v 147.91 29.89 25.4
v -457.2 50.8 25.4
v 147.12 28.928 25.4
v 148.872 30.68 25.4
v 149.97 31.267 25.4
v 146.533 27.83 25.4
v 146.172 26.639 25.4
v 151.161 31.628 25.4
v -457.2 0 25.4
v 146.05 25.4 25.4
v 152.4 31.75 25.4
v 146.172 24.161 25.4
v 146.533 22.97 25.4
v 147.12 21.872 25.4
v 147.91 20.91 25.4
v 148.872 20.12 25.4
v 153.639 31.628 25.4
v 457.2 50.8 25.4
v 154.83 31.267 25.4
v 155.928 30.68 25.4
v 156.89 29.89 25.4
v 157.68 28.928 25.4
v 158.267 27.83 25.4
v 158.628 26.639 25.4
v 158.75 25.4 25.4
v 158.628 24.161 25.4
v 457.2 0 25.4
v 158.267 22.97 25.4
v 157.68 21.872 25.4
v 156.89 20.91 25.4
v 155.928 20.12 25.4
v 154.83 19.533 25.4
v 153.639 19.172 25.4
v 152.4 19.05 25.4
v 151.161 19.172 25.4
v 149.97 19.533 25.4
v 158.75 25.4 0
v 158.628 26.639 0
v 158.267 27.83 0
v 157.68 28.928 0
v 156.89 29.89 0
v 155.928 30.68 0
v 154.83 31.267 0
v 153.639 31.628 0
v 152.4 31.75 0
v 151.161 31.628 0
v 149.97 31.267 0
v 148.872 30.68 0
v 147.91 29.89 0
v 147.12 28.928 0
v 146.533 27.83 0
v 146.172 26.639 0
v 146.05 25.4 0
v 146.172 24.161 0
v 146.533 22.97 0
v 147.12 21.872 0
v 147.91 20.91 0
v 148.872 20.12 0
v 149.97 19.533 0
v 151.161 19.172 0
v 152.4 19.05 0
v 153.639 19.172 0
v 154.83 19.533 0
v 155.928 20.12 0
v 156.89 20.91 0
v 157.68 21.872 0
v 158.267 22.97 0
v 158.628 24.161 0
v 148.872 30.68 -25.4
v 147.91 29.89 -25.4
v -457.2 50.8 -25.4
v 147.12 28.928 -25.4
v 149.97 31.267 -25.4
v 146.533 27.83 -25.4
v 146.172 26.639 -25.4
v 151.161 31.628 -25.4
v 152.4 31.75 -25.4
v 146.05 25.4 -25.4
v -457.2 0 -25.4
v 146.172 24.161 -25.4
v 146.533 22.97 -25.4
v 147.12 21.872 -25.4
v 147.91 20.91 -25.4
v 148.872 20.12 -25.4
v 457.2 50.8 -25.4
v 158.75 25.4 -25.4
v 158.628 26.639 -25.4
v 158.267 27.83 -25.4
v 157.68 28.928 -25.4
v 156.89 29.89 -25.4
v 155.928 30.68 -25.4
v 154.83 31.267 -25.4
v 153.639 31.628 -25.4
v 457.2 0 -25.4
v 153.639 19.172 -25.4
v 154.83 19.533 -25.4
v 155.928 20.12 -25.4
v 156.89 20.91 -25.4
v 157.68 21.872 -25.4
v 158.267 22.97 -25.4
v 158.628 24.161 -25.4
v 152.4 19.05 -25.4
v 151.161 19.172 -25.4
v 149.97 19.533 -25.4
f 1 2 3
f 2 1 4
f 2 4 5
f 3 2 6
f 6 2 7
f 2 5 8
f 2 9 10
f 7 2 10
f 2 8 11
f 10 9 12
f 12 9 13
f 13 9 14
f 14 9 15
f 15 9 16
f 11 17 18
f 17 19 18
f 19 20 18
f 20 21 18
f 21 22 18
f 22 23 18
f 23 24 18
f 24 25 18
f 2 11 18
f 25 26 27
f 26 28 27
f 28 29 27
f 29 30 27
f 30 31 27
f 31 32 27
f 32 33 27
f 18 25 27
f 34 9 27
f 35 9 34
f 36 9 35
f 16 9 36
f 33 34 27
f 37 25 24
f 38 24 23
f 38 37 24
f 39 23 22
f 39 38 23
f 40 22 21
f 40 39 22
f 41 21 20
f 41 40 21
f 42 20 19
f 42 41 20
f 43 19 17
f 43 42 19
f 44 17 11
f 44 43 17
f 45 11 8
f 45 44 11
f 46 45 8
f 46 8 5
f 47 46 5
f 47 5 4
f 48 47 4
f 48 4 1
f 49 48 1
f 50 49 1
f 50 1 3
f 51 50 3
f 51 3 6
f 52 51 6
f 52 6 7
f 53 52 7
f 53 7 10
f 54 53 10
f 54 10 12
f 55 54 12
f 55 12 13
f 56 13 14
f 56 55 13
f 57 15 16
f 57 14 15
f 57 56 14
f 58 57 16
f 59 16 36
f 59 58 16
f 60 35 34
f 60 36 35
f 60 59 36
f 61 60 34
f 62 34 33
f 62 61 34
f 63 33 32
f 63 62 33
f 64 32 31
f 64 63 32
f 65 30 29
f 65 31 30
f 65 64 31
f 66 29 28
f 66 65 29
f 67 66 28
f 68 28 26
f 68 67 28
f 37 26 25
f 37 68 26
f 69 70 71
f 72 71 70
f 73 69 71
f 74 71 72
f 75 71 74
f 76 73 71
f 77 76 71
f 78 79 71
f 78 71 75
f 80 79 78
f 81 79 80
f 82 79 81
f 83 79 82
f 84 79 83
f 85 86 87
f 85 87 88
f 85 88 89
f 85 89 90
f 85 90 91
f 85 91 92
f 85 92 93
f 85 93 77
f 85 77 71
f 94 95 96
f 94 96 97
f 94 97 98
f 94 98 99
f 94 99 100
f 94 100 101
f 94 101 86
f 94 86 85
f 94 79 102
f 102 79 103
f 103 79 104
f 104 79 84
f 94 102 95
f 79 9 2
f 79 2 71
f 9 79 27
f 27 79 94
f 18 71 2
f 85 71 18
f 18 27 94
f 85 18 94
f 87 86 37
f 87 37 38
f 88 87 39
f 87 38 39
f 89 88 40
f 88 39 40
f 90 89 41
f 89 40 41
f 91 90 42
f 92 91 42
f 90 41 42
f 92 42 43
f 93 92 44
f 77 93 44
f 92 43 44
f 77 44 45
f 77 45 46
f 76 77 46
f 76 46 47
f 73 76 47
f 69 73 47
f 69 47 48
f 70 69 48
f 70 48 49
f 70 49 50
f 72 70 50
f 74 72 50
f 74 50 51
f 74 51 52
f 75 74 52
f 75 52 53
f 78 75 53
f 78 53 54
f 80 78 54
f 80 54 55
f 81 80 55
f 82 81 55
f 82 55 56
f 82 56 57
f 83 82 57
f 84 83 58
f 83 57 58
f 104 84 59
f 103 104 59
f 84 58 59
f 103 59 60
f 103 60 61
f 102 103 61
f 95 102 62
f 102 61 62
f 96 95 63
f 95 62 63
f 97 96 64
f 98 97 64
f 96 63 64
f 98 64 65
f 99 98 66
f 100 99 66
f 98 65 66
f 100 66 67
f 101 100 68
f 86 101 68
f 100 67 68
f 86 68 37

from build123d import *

# Parameters (mm, degrees)
SKETCH1_W               = 914.4
SKETCH1_H               = 50.8
BOSS_EXTRUDE1_DEPTH     = 50.8
SKETCH2_R               = 6.35
CUT_EXTRUDE1_DEPTH      = 26.4
CUT_EXTRUDE1_DEPTH_BACK = 26.4


with BuildPart() as part:
    # Sketch1 → Boss-Extrude1 (new body)
    with BuildSketch(Plane(origin=(0, 0, 0), x_dir=(1, 0, 0), z_dir=(0, 1, 0))):
        Rectangle(SKETCH1_W, SKETCH1_H)
    extrude(amount=BOSS_EXTRUDE1_DEPTH)

    # Sketch2 → Cut-Extrude1 (cut, two sides)
    with BuildSketch(Plane.XY) as cut_extrude1_sk:
        with Locations((152.4, 25.4)):
            Circle(SKETCH2_R)
    extrude(amount=CUT_EXTRUDE1_DEPTH, mode=Mode.SUBTRACT)
    extrude(cut_extrude1_sk.sketch, amount=-CUT_EXTRUDE1_DEPTH_BACK, mode=Mode.SUBTRACT)


solid = part.part
